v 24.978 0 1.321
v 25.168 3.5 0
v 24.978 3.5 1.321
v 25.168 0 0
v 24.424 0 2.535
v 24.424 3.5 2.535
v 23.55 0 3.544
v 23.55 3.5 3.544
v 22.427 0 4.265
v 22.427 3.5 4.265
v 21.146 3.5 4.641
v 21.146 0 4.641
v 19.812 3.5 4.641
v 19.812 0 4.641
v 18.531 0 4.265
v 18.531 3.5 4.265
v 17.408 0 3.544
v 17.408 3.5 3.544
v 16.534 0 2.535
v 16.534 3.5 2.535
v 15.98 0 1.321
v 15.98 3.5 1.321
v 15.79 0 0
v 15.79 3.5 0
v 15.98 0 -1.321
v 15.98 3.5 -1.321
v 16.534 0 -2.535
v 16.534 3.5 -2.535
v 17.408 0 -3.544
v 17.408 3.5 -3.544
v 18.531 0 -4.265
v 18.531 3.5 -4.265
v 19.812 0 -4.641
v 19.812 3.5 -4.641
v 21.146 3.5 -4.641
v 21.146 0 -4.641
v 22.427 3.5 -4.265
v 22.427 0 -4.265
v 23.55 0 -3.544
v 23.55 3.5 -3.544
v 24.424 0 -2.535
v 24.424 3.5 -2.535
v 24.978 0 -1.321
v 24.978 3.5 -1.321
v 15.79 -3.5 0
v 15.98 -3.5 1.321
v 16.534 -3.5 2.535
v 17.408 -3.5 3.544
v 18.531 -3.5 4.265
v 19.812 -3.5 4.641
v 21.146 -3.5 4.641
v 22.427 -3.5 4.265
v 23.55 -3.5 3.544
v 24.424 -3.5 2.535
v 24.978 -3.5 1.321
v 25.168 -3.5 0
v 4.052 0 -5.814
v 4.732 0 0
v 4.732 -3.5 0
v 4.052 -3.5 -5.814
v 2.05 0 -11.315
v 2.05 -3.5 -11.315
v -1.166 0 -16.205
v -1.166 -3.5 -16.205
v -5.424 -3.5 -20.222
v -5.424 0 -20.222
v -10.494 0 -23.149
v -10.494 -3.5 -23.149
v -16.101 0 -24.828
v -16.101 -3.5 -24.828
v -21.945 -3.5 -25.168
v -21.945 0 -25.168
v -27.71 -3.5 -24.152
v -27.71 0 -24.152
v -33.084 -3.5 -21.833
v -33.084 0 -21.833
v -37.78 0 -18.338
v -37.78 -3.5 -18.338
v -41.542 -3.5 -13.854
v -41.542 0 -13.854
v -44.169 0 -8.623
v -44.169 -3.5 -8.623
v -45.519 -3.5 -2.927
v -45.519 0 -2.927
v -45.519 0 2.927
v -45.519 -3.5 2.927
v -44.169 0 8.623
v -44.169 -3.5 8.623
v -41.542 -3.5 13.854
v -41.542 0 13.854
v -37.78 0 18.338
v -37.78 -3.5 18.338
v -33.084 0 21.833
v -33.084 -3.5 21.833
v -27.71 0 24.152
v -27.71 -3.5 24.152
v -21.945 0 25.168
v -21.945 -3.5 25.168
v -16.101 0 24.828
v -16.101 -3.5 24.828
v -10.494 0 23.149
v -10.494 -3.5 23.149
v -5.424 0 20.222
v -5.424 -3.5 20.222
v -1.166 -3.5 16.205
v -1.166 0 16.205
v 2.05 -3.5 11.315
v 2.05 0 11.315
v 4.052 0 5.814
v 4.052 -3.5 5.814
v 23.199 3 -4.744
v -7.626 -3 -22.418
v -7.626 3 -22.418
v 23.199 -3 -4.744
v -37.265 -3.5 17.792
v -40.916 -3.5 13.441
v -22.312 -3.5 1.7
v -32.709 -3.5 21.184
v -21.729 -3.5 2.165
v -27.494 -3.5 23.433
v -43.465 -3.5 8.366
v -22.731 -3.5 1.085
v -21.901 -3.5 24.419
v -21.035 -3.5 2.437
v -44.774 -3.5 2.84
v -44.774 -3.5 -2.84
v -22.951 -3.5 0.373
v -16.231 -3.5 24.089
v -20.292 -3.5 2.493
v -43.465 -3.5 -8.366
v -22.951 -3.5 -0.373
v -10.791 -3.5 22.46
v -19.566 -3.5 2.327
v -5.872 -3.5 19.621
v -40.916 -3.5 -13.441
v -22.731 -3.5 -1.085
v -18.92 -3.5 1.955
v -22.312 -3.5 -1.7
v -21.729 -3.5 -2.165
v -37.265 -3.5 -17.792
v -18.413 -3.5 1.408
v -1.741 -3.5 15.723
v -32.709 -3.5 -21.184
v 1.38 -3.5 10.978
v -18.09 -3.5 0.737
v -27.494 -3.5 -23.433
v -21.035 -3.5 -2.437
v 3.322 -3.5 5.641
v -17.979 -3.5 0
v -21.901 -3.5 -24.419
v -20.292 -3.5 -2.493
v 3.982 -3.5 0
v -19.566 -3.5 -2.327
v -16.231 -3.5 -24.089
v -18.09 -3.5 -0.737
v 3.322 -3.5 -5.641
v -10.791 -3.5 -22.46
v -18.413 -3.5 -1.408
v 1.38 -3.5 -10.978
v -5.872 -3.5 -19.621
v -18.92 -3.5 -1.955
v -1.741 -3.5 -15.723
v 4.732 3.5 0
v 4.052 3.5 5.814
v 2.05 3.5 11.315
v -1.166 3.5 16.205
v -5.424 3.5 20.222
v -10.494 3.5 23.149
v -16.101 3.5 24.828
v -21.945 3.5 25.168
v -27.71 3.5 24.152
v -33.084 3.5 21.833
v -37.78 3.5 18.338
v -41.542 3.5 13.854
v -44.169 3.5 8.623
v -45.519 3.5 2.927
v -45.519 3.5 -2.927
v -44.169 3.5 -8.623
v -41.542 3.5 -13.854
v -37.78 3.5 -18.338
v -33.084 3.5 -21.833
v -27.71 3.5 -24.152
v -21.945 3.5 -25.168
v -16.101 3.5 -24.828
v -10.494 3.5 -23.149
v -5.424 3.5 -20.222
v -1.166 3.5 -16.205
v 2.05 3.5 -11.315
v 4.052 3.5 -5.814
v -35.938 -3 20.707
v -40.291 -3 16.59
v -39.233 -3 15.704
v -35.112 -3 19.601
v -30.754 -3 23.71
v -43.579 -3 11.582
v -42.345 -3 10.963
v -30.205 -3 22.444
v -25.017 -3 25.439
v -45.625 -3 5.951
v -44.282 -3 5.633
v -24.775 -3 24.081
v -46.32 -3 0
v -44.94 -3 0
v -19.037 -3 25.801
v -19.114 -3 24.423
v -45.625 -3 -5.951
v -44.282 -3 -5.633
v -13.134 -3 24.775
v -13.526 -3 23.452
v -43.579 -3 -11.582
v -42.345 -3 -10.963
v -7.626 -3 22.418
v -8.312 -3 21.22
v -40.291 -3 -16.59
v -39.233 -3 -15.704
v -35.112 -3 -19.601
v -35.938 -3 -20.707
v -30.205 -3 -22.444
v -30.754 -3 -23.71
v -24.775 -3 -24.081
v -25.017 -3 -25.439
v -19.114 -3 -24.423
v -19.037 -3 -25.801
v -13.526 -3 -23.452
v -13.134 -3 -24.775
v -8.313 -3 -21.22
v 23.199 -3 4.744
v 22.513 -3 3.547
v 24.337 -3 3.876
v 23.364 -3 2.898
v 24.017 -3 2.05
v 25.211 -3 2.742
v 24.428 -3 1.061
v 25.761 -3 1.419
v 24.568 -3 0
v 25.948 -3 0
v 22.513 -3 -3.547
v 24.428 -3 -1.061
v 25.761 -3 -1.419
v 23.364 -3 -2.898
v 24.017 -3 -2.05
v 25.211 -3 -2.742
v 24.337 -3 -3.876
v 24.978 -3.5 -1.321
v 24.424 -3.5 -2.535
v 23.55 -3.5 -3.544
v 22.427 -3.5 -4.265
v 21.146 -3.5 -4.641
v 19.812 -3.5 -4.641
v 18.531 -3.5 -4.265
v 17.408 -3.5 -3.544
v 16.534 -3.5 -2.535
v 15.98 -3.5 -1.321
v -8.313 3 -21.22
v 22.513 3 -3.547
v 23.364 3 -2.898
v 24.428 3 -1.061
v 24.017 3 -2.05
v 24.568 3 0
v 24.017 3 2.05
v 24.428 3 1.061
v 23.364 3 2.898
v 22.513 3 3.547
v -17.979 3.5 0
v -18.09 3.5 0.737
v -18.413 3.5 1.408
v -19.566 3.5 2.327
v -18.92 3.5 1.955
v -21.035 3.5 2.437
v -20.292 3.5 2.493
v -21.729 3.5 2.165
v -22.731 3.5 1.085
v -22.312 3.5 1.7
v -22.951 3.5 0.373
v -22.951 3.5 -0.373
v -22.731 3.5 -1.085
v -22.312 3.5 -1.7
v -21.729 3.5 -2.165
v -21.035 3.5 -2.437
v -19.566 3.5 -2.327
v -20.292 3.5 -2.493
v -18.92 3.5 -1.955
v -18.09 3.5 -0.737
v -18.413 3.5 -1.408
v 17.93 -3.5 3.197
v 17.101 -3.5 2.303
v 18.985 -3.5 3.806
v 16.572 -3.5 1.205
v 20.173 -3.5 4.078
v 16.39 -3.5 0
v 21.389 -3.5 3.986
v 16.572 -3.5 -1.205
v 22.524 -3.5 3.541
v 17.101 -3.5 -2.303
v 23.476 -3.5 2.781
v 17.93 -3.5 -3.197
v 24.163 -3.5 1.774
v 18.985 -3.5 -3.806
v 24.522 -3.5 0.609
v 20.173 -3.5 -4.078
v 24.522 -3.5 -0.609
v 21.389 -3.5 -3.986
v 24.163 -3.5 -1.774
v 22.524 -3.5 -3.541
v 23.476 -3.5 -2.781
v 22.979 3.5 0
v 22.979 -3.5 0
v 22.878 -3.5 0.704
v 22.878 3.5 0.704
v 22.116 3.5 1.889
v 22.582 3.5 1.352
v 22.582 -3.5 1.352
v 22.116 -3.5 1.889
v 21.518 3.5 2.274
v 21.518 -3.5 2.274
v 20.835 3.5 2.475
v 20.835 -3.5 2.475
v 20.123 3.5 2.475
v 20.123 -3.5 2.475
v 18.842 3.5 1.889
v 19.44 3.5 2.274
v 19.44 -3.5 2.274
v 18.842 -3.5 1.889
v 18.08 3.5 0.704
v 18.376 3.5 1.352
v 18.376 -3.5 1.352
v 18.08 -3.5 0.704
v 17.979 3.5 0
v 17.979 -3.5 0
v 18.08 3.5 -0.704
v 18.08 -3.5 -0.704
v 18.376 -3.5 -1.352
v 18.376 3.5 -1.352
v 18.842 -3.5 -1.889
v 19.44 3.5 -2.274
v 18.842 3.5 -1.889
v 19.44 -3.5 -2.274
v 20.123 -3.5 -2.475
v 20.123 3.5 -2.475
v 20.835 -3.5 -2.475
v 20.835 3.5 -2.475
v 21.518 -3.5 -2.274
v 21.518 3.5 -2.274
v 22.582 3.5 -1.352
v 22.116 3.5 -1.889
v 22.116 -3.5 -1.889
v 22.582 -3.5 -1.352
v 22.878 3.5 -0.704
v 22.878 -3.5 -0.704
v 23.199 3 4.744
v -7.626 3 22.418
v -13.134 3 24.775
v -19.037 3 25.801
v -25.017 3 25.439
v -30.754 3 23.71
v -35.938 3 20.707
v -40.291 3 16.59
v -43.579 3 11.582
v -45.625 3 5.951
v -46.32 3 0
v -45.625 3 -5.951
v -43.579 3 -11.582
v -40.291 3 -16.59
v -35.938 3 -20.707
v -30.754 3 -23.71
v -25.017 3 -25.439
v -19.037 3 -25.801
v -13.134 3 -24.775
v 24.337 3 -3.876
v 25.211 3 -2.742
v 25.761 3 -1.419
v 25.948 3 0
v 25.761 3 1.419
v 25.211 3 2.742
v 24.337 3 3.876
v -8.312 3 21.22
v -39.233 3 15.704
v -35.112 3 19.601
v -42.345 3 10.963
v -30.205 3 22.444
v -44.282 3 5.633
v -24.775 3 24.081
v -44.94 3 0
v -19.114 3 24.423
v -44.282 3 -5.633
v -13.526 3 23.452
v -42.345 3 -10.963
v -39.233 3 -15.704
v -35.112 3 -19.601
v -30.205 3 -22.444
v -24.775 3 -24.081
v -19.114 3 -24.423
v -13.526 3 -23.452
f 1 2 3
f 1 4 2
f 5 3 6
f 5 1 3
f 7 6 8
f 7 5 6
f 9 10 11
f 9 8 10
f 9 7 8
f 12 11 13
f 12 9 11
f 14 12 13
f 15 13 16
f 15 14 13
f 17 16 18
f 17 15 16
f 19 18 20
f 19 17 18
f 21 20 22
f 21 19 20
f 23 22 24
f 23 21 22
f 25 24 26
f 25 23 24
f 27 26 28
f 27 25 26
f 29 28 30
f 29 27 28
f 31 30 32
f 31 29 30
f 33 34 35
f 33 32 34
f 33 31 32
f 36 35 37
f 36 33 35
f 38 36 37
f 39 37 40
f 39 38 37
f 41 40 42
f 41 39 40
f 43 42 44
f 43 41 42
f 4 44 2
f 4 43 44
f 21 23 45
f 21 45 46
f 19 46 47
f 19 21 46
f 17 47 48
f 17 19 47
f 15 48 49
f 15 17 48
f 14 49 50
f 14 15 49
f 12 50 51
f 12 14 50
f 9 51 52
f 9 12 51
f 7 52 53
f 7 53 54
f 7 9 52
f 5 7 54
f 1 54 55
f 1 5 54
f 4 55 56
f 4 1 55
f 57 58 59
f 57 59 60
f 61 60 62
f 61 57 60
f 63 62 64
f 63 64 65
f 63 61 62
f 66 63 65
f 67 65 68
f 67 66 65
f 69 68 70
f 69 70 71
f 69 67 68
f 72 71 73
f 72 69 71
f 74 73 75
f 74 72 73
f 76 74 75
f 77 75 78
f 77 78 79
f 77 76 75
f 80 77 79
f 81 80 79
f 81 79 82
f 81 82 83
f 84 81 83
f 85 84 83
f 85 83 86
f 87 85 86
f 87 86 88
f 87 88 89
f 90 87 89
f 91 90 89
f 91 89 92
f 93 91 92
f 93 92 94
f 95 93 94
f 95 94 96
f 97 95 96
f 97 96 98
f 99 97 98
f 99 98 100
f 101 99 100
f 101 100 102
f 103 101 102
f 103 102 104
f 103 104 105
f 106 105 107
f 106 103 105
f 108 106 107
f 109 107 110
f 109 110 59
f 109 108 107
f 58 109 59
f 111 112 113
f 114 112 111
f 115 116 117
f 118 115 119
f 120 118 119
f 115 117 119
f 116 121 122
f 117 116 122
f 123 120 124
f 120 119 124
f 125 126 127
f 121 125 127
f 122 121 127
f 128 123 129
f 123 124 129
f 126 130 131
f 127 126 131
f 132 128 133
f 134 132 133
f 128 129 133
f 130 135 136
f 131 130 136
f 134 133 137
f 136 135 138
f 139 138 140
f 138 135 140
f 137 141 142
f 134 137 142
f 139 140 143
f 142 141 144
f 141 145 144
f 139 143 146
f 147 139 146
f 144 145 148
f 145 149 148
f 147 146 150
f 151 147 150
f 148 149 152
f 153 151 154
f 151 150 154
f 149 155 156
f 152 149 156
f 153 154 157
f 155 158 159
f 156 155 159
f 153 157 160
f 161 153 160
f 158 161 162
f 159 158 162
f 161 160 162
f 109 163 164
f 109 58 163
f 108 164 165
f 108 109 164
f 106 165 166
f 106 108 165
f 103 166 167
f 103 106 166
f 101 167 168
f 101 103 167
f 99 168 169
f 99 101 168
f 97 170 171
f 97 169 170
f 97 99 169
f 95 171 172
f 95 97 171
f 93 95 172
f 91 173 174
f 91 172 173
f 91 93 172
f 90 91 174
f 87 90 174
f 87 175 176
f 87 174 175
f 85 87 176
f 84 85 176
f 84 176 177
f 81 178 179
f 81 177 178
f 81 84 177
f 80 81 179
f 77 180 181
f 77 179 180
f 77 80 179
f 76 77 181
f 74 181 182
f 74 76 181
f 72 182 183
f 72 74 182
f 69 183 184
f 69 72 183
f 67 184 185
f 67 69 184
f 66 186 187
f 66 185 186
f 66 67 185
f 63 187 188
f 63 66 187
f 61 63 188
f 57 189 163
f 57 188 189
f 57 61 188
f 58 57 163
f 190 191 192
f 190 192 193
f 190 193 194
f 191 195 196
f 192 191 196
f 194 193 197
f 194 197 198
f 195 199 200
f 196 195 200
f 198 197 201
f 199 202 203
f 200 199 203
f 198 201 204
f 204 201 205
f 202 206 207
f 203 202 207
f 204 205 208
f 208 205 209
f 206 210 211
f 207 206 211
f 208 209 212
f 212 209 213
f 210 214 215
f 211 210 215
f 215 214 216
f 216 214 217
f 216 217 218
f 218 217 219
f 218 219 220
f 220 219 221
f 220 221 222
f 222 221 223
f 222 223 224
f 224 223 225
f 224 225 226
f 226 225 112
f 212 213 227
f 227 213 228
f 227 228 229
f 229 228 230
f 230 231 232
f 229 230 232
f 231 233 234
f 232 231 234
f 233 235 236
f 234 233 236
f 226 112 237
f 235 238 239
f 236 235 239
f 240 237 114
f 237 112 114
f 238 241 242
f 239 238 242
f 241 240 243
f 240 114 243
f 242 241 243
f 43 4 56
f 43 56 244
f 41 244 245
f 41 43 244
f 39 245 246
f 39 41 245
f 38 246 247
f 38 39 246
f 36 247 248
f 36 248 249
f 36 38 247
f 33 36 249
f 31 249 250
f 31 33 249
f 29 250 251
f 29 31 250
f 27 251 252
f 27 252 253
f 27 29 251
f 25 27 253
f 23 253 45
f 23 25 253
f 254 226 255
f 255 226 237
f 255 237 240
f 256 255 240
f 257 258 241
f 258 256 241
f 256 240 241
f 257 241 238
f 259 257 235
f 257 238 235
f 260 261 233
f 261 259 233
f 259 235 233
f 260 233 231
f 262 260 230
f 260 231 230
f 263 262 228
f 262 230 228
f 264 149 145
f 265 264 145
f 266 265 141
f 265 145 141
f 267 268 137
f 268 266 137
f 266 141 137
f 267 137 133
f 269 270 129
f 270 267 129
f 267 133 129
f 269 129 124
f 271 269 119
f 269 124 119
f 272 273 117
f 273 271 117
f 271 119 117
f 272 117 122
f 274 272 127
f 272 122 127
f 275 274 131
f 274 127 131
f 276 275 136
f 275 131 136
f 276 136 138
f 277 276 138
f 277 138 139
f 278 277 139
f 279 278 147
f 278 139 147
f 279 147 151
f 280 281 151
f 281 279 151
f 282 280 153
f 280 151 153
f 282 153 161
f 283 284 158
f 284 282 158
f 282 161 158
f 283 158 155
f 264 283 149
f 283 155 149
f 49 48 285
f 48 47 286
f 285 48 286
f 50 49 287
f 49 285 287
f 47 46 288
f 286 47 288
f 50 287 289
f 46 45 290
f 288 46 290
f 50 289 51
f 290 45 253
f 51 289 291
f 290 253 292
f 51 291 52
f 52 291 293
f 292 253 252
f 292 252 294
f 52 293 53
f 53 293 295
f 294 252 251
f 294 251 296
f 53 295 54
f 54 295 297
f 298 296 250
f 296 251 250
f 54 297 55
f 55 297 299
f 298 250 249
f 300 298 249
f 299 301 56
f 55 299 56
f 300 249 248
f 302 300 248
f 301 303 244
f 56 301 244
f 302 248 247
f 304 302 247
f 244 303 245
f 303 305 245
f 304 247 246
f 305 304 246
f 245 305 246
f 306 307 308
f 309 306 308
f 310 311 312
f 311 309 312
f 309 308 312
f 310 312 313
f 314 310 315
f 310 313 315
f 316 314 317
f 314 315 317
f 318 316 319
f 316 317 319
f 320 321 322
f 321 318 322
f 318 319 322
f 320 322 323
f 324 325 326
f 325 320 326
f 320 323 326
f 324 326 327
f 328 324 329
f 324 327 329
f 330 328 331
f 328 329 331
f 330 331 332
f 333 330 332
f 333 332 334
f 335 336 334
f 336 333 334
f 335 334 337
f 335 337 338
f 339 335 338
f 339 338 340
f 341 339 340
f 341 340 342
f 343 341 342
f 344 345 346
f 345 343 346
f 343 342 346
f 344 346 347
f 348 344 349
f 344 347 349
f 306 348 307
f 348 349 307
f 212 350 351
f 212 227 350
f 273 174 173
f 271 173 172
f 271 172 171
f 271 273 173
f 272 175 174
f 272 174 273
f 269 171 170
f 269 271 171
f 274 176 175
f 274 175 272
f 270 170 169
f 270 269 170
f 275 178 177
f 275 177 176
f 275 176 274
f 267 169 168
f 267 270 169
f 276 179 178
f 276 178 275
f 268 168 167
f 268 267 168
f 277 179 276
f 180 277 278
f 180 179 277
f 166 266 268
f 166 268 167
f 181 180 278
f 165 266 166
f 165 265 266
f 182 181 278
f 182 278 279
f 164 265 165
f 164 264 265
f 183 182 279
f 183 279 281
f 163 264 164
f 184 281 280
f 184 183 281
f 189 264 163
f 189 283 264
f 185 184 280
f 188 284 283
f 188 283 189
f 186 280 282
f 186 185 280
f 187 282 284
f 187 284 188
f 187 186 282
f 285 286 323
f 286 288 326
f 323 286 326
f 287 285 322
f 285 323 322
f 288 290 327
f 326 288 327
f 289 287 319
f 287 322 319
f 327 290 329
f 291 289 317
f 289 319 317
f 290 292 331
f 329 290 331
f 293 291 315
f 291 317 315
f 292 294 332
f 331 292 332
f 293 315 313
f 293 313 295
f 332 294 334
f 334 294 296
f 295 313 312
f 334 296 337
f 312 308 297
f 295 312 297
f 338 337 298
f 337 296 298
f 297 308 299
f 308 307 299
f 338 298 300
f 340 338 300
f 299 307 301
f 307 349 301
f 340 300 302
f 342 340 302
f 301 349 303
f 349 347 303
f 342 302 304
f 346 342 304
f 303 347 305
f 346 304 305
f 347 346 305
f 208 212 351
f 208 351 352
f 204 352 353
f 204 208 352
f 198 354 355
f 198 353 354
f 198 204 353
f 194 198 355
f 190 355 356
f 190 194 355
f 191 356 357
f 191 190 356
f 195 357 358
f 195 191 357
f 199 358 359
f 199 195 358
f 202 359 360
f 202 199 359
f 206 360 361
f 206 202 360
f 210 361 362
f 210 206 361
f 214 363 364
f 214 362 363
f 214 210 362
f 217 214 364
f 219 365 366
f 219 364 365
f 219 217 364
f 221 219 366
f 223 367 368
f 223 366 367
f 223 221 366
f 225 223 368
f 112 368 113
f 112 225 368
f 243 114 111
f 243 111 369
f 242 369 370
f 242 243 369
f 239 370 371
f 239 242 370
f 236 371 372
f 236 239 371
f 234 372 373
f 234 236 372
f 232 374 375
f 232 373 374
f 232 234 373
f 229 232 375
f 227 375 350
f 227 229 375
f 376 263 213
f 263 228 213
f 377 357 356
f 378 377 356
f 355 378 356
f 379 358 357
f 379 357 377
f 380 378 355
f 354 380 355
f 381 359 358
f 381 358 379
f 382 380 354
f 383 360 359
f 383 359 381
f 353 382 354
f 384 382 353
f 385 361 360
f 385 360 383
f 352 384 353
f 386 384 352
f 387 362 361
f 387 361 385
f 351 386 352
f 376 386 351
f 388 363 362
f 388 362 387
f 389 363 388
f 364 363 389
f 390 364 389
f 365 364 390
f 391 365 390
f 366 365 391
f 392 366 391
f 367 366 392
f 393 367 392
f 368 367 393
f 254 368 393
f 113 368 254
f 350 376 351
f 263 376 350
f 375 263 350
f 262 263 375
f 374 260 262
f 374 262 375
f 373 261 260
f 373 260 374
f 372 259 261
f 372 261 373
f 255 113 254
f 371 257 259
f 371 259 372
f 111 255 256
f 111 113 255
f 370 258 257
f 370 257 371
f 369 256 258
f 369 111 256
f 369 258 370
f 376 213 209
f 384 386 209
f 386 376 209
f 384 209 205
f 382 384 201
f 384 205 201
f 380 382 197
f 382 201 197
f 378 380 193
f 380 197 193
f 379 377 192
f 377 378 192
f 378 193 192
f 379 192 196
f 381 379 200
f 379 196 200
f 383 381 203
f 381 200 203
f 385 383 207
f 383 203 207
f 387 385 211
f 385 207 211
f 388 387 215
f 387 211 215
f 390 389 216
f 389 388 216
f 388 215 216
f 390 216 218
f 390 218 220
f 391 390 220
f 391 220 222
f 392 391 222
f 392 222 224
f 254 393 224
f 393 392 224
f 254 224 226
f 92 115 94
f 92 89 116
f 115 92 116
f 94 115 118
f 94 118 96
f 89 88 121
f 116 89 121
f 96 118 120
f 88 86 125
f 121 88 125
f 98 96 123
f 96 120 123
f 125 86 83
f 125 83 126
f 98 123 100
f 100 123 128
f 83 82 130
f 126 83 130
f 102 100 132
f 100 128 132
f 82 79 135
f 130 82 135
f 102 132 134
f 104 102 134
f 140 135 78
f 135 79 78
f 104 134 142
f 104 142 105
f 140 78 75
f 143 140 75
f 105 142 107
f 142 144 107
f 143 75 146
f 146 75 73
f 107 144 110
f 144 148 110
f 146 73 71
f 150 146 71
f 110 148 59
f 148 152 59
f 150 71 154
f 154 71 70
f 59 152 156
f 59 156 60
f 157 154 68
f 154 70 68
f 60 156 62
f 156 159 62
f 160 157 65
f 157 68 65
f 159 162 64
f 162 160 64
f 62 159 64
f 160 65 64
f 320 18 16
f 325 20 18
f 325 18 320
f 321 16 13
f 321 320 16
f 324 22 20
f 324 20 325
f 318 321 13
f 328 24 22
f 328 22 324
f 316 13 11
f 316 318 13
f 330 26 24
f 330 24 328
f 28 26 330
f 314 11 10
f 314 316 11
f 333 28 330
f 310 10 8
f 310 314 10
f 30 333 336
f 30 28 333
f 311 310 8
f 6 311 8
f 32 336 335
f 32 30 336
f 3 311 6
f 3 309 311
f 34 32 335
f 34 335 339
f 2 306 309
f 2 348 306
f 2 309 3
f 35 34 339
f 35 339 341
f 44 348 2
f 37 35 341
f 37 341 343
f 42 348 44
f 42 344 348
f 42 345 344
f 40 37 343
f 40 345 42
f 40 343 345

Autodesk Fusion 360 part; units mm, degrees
sketch "Sketch1" plane through (0, 0, 0) normal (0, 1, 0) x (1, 0, 0) in component "Pulley1"
  line L0 (-20.479, 0) -> (20.479, 0)
  circle A0 centre (-20.479, 0) radius 25.2108
  circle A1 centre (-20.479, 0) radius 24.4608
  line L1 (-20.479, 0) -> (-20.479, -25.2108) construction
  line L2 (-20.479, 0) -> (-18.501, -25.1331) construction
  circle A2 centre (-20.479, 0) radius 25.0608 construction
  circle A3 centre (-20.479, 0) radius 2.5
  dimension "d133" = 40.958
  dimension "d134" = 50.4216
  dimension "d135" = -0.75
  dimension "d136" = 4.5
  dimension "d142" = 5
extrude "Extrude2" add sketch "Sketch1" along normal mid plane 7 contours A1 | A0 makes body 1 in component "Pulley1"
sketch "Sketch1 (2)" plane through (0, 0, 0) normal (0, 1, 0) x (1, 0, 0) in component "Pulley2"
  line L0 (20.479, 0) -> (-20.479, 0)
  circle A0 centre (20.479, 0) radius 4.839 construction
  circle A1 centre (20.479, 0) radius 4.089
  circle A2 centre (20.479, 0) radius 4.689
  line L1 (20.479, 0) -> (20.479, -4.839) construction
  line L2 (20.479, 0) -> (18.6272, -4.4706) construction
  line L3 (20.479, -4.089) -> (20.479, -4.644) construction
  line L4 (18.9142, -3.7777) -> (18.7018, -4.2905) construction
  circle A3 centre (20.479, 0) radius 2.5
  dimension "d149" = 40.958
  dimension "d150" = 9.6779
  dimension "d151" = -0.75
  dimension "d153" = 22.5
  dimension "d187" = 0.555
  dimension "d188" = 0.555
  dimension "d196" = 5
sketch "Sketch2" plane through (0, 0, 0) normal (0, 1, 0) x (1, 0, 0) in component "Belt"
  line L0 (20.479, 0) -> (-20.479, 0)
  circle A0 centre (-20.479, 0) radius 25.2108 construction
  line L1 (-20.479, 0) -> (-20.479, -25.2108) construction
  circle A1 centre (-20.479, 0) radius 24.4608 construction
  circle A2 centre (20.479, 0) radius 5.093 construction
  line L2 (62.777, 18.3802) -> (-7.8132, -22.0915) construction
  line L3 (39.5189, -5.0456) -> (-31.5457, 35.6981) construction
  line L4 (23.0121, -4.4183) -> (-7.8132, -22.0915)
  line L5 (-7.8132, 22.0915) -> (23.0121, 4.4183)
  arc A3 (23.0121, -4.4183) -> (23.0121, 4.4183) centre (20.479, 0) ccw
  arc A4 (-7.8132, 22.0915) -> (-7.8132, -22.0915) centre (-20.479, 0) ccw
  arc A5 (-7.6262, 22.4177) -> (-7.6261, -22.4177) centre (-20.479, 0) ccw
  line L6 (23.1991, -4.7445) -> (-7.6261, -22.4177)
  arc A6 (23.1991, -4.7445) -> (23.1992, 4.7445) centre (20.479, 0) ccw
  line L7 (-7.6262, 22.4177) -> (23.1992, 4.7445)
  line L8 (22.5128, -3.5473) -> (-8.3125, -21.2205)
  arc A7 (-8.3126, 21.2205) -> (-8.3125, -21.2205) centre (-20.479, 0) ccw
  line L9 (-8.3126, 21.2205) -> (22.5128, 3.5473)
  arc A8 (22.5128, -3.5473) -> (22.5128, 3.5473) centre (20.479, 0) ccw
  line L10 (22.8361, -4.1112) -> (-7.9892, -21.7844)
  arc A9 (-7.9893, 21.7844) -> (-7.9892, -21.7844) centre (-20.479, 0) ccw
  line L11 (-7.9893, 21.7844) -> (22.8361, 4.1112)
  arc A10 (22.8361, -4.1112) -> (22.8361, 4.1112) centre (20.479, 0) ccw
  point P0 (-23.0331, -25.0158)
  dimension "d165" = 40.958
  dimension "d166" = 50.4216
  dimension "d167" = -0.75
  dimension "d171" = 50.9296
  dimension "d172" = 10.1859
  dimension "d174" = 81.916
  dimension "d177" = -0.354
extrude "Extrude2'" add sketch "Sketch2" along normal mid plane 6 separate body contours L4 L5 A3 A4 | A5 L6 A6 L7 | L10 A9 L11 A10 makes body 2 in component "Belt"
extrude "Extrude4" add sketch "Sketch1 (2)" along normal mid plane 7 separate body contours A1 | A2 makes body 3 in component "Pulley2"
component "Pulley1" placed x (1, 0, 0) y (0, 1, 0) z (0, 0, 1) at (0, 0, 0)
component "Pulley2" placed x (1, 0, 0) y (0, 1, 0) z (0, 0, 1) at (0, 0, 0)
component "Belt" placed x (1, 0, 0) y (0, 1, 0) z (0, 0, 1) at (0, 0, 0)
equation "C2C = ( ( varA + sqrt(pow(varA; 2) - 2 * varB) ) / 4 ) * 1 mm"
equation "beltThickness = 1.38 mm"
equation "rearBeltThickness = beltThickness - 1.004 mm"
equation "frontBeltThickness = beltThickness - 0.376 mm"
equation "beltWidth = 6 mm"
equation "ToothHeight = -0.75 mm"
equation "OD1 = ( D1 * mm ) - ( 2 * U )"
equation "OD2 = ( D2 * mm ) - ( 2 * U )"
equation "toothD = ( 0.555 * 2 ) * 1 mm"
equation "pulleyToothRound = ( 0.15 * 2 ) * 1 mm"
equation "pulleyWidth = beltWidth + 1 mm"
equation "boreID = 5 mm"
equation "toothPD = 0.15 mm"
equation "RD1 = ( ( 360 / Pulley1ToothCount ) * 1 deg )"
equation "RD2 = ( ( 360 / Pulley2ToothCount ) * 1 deg )"
equation "d133 = C2C"
equation "d134 = OD1"
equation "d135 = ToothHeight"
equation "d136 = RD1"
equation "d147 = pulleyWidth"
equation "d149 = C2C"
equation "d150 = OD2"
equation "d151 = ToothHeight"
equation "d153 = RD2"
equation "d165 = C2C"
equation "d166 = OD1"
equation "d167 = ToothHeight"
equation "d171 = D1 * mm"
equation "d172 = D2 * mm"
equation "d174 = C2C * 2"
equation "d177 = -frontBeltThickness + 0.65 mm"
equation "d182 = beltWidth"
equation "d187 = toothD / 2"
equation "d188 = toothD / 2"
equation "d197 = pulleyWidth"
